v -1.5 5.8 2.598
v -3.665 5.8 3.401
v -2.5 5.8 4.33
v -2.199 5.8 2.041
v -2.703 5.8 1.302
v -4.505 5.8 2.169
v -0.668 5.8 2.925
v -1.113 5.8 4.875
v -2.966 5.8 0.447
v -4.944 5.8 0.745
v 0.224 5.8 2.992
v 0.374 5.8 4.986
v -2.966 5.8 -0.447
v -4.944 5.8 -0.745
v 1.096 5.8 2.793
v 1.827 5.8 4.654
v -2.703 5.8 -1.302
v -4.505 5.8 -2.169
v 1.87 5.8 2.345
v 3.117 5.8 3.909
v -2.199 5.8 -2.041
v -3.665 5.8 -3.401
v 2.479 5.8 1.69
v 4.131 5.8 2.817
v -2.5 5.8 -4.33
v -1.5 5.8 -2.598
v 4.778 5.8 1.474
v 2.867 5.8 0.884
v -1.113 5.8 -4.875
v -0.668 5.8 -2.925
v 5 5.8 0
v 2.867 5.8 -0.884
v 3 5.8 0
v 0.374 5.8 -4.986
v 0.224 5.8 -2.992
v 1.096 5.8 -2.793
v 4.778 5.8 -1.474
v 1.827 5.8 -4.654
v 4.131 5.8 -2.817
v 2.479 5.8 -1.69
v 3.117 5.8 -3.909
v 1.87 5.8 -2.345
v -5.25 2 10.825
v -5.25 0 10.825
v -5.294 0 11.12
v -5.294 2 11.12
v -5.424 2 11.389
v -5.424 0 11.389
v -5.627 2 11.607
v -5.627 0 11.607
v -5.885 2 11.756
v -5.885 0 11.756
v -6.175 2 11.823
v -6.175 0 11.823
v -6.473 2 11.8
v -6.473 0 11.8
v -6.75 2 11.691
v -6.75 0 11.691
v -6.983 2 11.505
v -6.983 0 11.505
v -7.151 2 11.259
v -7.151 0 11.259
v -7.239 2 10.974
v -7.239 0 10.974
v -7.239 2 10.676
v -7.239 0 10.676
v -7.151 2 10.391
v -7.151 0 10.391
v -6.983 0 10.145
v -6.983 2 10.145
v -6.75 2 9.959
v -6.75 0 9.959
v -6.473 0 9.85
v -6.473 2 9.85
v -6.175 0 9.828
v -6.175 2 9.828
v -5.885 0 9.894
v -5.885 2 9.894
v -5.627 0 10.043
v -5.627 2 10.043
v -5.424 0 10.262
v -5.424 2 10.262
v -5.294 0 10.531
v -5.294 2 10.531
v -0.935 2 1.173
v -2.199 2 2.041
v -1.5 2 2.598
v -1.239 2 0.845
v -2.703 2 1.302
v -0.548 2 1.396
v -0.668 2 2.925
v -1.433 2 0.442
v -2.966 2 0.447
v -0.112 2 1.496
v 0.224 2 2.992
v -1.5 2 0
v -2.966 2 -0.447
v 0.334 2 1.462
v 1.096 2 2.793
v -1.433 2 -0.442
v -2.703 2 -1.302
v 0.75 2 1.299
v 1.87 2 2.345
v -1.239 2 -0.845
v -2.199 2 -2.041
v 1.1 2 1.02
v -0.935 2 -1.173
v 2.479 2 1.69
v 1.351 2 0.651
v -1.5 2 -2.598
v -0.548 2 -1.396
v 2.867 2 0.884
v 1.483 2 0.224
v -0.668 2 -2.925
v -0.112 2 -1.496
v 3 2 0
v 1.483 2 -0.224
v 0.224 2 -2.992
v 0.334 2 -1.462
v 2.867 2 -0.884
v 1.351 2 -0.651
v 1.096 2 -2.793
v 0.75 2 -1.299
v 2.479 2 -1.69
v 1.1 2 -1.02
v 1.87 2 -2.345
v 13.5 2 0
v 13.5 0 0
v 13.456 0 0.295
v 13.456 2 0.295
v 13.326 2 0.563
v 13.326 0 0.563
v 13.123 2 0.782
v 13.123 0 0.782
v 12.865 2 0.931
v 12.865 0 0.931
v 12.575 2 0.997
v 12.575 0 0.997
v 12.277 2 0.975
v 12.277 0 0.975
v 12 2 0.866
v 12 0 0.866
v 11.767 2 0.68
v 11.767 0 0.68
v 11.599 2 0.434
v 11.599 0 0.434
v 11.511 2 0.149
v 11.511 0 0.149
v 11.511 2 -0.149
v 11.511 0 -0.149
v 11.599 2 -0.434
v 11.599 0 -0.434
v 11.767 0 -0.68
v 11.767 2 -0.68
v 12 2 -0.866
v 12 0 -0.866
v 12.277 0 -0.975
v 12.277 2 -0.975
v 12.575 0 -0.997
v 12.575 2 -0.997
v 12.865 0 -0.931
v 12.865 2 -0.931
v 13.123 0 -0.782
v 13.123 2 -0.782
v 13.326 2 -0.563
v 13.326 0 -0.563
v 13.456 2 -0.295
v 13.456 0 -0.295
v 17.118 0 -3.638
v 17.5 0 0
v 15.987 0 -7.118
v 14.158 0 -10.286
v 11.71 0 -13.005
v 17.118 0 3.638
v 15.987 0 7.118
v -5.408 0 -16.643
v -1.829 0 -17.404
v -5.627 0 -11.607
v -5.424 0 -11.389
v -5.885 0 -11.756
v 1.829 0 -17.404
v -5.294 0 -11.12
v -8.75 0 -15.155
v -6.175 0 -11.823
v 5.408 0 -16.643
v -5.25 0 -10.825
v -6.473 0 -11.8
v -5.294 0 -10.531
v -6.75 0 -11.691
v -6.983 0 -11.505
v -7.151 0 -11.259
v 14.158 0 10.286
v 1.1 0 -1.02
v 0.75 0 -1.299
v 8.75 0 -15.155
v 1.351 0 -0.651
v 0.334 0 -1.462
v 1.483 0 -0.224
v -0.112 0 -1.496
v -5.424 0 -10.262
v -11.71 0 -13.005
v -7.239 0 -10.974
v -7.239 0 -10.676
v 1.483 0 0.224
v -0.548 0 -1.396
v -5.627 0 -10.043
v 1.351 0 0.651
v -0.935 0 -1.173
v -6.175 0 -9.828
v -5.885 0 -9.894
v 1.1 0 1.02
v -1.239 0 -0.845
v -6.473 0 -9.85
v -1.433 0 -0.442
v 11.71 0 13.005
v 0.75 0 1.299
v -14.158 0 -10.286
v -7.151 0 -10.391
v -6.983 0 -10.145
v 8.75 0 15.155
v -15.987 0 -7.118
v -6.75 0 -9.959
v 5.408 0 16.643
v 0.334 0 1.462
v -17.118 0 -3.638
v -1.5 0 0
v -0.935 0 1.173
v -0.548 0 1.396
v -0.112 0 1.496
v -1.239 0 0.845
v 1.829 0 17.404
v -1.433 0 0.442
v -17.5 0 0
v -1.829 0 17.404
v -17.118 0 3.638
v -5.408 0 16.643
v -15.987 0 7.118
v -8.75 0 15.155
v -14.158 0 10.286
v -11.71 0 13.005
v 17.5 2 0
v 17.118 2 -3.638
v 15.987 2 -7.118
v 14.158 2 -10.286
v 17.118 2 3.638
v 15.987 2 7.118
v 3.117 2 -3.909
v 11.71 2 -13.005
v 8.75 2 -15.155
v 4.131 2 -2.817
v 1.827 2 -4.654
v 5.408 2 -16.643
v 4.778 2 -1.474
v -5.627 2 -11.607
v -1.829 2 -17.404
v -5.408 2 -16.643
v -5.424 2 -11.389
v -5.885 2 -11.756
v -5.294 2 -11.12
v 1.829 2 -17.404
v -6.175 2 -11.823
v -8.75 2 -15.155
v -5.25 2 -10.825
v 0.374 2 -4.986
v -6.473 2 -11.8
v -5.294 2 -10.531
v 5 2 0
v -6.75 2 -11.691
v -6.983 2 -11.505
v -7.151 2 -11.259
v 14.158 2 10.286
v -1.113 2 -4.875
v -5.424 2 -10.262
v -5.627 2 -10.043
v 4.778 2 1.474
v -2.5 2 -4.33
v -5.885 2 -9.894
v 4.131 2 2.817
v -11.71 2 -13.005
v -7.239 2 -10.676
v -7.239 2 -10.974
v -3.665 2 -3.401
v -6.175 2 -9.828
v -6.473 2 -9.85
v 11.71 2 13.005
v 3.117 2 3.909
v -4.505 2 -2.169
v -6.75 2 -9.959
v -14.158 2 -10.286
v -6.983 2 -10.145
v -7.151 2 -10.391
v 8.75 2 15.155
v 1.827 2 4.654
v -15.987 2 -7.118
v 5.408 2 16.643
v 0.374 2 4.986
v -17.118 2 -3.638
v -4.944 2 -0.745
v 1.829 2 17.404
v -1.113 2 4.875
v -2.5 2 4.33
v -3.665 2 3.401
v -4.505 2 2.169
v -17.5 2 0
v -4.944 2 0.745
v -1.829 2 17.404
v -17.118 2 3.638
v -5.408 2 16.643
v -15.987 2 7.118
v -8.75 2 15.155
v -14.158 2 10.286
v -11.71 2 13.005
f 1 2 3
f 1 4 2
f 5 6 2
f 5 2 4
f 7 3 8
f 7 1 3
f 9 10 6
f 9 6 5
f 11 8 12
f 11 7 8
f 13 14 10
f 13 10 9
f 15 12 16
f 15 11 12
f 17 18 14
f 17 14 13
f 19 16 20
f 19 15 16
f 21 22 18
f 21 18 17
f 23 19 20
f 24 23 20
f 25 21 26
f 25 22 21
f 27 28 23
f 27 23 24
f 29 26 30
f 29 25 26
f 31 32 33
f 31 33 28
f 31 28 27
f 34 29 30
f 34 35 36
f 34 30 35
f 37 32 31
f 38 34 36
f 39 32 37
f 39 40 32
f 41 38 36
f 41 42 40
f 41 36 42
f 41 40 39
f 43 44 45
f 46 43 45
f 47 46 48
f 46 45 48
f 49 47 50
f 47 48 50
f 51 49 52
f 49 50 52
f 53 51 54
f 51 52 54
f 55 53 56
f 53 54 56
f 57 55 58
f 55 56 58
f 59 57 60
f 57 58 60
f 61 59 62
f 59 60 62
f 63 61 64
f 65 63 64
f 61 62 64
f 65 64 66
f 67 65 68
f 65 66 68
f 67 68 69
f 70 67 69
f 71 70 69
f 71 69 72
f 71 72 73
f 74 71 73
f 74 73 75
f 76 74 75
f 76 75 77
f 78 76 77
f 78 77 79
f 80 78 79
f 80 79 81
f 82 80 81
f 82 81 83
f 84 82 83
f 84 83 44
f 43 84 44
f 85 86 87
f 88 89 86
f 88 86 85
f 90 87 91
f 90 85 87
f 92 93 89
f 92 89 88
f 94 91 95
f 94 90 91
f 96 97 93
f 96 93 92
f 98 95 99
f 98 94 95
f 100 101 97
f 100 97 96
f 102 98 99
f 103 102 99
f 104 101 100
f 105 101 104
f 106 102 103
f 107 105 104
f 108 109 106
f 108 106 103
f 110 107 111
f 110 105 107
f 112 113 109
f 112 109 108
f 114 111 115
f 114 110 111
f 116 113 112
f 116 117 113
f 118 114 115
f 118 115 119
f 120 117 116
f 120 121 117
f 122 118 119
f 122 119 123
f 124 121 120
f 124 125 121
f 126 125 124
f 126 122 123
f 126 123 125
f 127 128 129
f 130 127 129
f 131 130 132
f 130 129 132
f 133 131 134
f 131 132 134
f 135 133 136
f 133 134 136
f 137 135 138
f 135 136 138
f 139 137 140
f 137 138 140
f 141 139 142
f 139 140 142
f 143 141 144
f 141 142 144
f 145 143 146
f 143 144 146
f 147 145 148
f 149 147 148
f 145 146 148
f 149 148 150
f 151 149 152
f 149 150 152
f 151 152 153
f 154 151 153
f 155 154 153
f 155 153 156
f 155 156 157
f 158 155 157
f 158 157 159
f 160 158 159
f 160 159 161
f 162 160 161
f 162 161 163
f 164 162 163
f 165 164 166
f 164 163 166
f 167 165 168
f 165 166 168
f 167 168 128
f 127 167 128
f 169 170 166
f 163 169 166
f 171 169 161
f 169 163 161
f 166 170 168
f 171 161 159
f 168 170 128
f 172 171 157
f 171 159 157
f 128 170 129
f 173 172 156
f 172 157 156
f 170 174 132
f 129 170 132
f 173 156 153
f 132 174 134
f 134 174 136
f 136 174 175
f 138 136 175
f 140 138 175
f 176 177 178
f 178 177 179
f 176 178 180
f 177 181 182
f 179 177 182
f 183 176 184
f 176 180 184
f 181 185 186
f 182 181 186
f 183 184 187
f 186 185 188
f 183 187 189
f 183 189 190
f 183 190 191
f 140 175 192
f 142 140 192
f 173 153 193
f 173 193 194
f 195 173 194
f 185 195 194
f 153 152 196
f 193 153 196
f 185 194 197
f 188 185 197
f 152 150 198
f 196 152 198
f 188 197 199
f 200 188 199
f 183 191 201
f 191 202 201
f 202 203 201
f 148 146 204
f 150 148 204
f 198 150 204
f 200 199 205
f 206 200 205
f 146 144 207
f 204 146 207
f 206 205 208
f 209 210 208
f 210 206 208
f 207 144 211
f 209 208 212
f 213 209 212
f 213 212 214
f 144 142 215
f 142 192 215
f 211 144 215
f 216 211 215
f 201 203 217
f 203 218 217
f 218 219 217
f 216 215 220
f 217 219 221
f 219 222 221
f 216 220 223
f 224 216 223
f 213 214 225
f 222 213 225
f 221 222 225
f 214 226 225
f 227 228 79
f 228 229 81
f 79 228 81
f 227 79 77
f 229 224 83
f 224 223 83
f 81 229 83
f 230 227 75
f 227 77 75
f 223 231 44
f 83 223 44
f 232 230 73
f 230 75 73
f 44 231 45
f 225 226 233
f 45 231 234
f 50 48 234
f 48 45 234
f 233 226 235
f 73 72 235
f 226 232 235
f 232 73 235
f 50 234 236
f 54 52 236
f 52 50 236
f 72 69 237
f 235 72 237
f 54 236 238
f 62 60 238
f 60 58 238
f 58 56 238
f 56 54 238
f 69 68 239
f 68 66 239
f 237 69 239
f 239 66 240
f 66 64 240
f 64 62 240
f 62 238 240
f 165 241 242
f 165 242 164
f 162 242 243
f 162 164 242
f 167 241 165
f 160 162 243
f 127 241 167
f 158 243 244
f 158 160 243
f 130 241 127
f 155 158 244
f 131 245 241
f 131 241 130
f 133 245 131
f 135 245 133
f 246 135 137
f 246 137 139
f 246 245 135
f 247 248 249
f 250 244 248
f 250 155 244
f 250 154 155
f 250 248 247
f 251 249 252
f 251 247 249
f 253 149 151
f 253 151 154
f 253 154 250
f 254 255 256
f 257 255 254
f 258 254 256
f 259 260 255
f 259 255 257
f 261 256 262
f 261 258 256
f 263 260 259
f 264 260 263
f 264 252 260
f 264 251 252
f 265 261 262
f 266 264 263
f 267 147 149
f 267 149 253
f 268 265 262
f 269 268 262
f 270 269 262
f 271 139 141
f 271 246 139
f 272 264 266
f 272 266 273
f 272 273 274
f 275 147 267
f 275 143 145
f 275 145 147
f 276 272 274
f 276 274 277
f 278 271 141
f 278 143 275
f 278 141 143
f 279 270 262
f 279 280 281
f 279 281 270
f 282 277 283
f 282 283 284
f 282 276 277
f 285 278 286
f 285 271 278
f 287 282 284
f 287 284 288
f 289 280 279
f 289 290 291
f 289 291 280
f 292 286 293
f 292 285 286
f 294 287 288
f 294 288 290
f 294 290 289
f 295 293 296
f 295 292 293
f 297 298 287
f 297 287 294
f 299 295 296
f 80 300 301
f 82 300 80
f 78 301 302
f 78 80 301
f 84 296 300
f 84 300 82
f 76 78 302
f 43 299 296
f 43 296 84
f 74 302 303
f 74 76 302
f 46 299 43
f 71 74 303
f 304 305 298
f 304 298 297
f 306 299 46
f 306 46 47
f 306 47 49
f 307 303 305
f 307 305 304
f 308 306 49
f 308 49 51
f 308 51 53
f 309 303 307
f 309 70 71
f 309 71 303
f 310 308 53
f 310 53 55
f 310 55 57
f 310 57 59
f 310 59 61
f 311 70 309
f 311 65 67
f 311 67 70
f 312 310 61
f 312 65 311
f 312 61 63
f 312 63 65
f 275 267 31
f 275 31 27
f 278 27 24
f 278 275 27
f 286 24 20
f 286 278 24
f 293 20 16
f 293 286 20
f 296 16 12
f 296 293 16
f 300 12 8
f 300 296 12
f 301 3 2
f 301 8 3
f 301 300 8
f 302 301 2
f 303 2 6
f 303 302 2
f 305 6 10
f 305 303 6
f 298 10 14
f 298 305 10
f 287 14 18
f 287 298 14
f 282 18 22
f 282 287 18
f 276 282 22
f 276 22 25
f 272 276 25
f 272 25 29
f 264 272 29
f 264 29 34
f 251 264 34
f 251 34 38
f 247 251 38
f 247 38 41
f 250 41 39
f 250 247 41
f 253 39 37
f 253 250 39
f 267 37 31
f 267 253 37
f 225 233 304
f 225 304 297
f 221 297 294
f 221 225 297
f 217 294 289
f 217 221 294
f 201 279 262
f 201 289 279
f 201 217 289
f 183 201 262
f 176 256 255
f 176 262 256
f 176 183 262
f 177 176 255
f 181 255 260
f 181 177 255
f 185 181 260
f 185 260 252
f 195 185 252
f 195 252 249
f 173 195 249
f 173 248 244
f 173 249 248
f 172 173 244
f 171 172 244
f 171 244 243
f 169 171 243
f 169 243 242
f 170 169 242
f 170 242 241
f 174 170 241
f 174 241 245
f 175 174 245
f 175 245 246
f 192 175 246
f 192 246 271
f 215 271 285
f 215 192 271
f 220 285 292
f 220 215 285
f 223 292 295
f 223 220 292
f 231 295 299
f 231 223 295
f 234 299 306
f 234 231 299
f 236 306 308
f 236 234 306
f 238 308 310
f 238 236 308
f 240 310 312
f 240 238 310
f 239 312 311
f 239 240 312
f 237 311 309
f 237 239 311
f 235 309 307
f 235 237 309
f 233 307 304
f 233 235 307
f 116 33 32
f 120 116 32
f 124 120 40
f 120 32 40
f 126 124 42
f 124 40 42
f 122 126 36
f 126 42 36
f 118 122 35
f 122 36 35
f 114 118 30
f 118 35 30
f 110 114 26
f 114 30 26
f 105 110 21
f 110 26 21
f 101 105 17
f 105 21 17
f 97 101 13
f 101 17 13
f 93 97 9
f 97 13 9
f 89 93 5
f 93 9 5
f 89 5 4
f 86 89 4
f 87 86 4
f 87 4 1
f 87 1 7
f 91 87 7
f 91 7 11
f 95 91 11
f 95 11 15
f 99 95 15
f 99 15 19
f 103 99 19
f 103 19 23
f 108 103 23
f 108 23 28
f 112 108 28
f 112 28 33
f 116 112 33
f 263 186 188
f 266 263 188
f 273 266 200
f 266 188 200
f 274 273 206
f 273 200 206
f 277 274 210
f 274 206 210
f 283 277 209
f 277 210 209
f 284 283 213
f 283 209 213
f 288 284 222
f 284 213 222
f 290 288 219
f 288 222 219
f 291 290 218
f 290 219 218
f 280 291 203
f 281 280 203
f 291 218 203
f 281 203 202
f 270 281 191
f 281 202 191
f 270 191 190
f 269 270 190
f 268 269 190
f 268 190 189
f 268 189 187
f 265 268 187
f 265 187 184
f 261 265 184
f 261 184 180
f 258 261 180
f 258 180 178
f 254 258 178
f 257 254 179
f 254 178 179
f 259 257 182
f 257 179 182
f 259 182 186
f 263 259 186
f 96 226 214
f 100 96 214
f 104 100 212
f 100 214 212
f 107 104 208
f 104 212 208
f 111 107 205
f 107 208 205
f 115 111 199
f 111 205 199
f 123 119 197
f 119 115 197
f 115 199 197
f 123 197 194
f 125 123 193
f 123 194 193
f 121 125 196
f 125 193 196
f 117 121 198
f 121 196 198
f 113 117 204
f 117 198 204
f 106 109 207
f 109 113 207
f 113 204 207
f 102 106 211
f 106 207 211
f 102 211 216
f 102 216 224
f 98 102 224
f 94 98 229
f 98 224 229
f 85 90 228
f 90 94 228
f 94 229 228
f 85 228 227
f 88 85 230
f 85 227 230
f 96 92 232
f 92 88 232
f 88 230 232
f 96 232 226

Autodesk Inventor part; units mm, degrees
ref_plane "YZ Plane" through (0, 0, 0) normal (1, 0, 0) x (0, 1, 0)
ref_plane "XZ Plane" through (0, 0, 0) normal (0, 1, 0) x (-1, 0, 0)
ref_plane "XY Plane" through (0, 0, 0) normal (0, 0, 1) x (1, 0, 0)
sketch "Sketch1" plane through (0, 0, 0) normal (0, 1, 0) x (-1, 0, 0)
  circle A0 centre (0, 0) radius 17.5
  circle A1 centre (0, 0) radius 1.5
  dimension "d0" = 35
  dimension "d1" = 3
extrude "Extrusion1" add sketch "Sketch1" along normal blind 2
sketch "Sketch2" plane through (0, 2, 0) normal (0, 1, 0) x (1, 0, 0)
  circle A0 centre (0, 0) radius 17.5 projected
  circle A1 centre (0, 0) radius 5
  dimension "d4" = 10
extrude "Extrusion2" add sketch "Sketch2" along normal blind 3.8 contours A1
sketch "Sketch3" plane through (0, 5.8, 0) normal (0, 1, 0) x (1, 0, 0)
  circle A0 centre (0, 0) radius 5 projected
  circle A1 centre (0, 0) radius 3
  dimension "d7" = 6
extrude "Extrusion3" cut sketch "Sketch3" against normal blind 3.8 contours A1
sketch "Sketch4" plane through (0, 0, 0) normal (0, -1, 0) x (1, 0, 0)
  circle A0 centre (0, 0) radius 17.5 projected
  circle A1 centre (12.5, 0) radius 1
  line L0 (0, 0) -> (-6.25, 10.8253)
  line L1 (0, 0) -> (12.5, 0) construction
  line L2 (0, 0) -> (-6.25, -10.8253)
  line L3 (0, 0) -> (12.5, 0) construction
  circle A2 centre (-6.25, 10.8253) radius 1
  circle A3 centre (-6.25, -10.8253) radius 1
  dimension "d11" = 2
  dimension "d12" = 120
  dimension "d13" = 120
  dimension "d14" = 2
  dimension "d15" = 2
extrude "Extrusion4" cut sketch "Sketch4" against normal blind 3.8 contours A1 | A2 | A3
properties part number "servo_paka_dolu"
